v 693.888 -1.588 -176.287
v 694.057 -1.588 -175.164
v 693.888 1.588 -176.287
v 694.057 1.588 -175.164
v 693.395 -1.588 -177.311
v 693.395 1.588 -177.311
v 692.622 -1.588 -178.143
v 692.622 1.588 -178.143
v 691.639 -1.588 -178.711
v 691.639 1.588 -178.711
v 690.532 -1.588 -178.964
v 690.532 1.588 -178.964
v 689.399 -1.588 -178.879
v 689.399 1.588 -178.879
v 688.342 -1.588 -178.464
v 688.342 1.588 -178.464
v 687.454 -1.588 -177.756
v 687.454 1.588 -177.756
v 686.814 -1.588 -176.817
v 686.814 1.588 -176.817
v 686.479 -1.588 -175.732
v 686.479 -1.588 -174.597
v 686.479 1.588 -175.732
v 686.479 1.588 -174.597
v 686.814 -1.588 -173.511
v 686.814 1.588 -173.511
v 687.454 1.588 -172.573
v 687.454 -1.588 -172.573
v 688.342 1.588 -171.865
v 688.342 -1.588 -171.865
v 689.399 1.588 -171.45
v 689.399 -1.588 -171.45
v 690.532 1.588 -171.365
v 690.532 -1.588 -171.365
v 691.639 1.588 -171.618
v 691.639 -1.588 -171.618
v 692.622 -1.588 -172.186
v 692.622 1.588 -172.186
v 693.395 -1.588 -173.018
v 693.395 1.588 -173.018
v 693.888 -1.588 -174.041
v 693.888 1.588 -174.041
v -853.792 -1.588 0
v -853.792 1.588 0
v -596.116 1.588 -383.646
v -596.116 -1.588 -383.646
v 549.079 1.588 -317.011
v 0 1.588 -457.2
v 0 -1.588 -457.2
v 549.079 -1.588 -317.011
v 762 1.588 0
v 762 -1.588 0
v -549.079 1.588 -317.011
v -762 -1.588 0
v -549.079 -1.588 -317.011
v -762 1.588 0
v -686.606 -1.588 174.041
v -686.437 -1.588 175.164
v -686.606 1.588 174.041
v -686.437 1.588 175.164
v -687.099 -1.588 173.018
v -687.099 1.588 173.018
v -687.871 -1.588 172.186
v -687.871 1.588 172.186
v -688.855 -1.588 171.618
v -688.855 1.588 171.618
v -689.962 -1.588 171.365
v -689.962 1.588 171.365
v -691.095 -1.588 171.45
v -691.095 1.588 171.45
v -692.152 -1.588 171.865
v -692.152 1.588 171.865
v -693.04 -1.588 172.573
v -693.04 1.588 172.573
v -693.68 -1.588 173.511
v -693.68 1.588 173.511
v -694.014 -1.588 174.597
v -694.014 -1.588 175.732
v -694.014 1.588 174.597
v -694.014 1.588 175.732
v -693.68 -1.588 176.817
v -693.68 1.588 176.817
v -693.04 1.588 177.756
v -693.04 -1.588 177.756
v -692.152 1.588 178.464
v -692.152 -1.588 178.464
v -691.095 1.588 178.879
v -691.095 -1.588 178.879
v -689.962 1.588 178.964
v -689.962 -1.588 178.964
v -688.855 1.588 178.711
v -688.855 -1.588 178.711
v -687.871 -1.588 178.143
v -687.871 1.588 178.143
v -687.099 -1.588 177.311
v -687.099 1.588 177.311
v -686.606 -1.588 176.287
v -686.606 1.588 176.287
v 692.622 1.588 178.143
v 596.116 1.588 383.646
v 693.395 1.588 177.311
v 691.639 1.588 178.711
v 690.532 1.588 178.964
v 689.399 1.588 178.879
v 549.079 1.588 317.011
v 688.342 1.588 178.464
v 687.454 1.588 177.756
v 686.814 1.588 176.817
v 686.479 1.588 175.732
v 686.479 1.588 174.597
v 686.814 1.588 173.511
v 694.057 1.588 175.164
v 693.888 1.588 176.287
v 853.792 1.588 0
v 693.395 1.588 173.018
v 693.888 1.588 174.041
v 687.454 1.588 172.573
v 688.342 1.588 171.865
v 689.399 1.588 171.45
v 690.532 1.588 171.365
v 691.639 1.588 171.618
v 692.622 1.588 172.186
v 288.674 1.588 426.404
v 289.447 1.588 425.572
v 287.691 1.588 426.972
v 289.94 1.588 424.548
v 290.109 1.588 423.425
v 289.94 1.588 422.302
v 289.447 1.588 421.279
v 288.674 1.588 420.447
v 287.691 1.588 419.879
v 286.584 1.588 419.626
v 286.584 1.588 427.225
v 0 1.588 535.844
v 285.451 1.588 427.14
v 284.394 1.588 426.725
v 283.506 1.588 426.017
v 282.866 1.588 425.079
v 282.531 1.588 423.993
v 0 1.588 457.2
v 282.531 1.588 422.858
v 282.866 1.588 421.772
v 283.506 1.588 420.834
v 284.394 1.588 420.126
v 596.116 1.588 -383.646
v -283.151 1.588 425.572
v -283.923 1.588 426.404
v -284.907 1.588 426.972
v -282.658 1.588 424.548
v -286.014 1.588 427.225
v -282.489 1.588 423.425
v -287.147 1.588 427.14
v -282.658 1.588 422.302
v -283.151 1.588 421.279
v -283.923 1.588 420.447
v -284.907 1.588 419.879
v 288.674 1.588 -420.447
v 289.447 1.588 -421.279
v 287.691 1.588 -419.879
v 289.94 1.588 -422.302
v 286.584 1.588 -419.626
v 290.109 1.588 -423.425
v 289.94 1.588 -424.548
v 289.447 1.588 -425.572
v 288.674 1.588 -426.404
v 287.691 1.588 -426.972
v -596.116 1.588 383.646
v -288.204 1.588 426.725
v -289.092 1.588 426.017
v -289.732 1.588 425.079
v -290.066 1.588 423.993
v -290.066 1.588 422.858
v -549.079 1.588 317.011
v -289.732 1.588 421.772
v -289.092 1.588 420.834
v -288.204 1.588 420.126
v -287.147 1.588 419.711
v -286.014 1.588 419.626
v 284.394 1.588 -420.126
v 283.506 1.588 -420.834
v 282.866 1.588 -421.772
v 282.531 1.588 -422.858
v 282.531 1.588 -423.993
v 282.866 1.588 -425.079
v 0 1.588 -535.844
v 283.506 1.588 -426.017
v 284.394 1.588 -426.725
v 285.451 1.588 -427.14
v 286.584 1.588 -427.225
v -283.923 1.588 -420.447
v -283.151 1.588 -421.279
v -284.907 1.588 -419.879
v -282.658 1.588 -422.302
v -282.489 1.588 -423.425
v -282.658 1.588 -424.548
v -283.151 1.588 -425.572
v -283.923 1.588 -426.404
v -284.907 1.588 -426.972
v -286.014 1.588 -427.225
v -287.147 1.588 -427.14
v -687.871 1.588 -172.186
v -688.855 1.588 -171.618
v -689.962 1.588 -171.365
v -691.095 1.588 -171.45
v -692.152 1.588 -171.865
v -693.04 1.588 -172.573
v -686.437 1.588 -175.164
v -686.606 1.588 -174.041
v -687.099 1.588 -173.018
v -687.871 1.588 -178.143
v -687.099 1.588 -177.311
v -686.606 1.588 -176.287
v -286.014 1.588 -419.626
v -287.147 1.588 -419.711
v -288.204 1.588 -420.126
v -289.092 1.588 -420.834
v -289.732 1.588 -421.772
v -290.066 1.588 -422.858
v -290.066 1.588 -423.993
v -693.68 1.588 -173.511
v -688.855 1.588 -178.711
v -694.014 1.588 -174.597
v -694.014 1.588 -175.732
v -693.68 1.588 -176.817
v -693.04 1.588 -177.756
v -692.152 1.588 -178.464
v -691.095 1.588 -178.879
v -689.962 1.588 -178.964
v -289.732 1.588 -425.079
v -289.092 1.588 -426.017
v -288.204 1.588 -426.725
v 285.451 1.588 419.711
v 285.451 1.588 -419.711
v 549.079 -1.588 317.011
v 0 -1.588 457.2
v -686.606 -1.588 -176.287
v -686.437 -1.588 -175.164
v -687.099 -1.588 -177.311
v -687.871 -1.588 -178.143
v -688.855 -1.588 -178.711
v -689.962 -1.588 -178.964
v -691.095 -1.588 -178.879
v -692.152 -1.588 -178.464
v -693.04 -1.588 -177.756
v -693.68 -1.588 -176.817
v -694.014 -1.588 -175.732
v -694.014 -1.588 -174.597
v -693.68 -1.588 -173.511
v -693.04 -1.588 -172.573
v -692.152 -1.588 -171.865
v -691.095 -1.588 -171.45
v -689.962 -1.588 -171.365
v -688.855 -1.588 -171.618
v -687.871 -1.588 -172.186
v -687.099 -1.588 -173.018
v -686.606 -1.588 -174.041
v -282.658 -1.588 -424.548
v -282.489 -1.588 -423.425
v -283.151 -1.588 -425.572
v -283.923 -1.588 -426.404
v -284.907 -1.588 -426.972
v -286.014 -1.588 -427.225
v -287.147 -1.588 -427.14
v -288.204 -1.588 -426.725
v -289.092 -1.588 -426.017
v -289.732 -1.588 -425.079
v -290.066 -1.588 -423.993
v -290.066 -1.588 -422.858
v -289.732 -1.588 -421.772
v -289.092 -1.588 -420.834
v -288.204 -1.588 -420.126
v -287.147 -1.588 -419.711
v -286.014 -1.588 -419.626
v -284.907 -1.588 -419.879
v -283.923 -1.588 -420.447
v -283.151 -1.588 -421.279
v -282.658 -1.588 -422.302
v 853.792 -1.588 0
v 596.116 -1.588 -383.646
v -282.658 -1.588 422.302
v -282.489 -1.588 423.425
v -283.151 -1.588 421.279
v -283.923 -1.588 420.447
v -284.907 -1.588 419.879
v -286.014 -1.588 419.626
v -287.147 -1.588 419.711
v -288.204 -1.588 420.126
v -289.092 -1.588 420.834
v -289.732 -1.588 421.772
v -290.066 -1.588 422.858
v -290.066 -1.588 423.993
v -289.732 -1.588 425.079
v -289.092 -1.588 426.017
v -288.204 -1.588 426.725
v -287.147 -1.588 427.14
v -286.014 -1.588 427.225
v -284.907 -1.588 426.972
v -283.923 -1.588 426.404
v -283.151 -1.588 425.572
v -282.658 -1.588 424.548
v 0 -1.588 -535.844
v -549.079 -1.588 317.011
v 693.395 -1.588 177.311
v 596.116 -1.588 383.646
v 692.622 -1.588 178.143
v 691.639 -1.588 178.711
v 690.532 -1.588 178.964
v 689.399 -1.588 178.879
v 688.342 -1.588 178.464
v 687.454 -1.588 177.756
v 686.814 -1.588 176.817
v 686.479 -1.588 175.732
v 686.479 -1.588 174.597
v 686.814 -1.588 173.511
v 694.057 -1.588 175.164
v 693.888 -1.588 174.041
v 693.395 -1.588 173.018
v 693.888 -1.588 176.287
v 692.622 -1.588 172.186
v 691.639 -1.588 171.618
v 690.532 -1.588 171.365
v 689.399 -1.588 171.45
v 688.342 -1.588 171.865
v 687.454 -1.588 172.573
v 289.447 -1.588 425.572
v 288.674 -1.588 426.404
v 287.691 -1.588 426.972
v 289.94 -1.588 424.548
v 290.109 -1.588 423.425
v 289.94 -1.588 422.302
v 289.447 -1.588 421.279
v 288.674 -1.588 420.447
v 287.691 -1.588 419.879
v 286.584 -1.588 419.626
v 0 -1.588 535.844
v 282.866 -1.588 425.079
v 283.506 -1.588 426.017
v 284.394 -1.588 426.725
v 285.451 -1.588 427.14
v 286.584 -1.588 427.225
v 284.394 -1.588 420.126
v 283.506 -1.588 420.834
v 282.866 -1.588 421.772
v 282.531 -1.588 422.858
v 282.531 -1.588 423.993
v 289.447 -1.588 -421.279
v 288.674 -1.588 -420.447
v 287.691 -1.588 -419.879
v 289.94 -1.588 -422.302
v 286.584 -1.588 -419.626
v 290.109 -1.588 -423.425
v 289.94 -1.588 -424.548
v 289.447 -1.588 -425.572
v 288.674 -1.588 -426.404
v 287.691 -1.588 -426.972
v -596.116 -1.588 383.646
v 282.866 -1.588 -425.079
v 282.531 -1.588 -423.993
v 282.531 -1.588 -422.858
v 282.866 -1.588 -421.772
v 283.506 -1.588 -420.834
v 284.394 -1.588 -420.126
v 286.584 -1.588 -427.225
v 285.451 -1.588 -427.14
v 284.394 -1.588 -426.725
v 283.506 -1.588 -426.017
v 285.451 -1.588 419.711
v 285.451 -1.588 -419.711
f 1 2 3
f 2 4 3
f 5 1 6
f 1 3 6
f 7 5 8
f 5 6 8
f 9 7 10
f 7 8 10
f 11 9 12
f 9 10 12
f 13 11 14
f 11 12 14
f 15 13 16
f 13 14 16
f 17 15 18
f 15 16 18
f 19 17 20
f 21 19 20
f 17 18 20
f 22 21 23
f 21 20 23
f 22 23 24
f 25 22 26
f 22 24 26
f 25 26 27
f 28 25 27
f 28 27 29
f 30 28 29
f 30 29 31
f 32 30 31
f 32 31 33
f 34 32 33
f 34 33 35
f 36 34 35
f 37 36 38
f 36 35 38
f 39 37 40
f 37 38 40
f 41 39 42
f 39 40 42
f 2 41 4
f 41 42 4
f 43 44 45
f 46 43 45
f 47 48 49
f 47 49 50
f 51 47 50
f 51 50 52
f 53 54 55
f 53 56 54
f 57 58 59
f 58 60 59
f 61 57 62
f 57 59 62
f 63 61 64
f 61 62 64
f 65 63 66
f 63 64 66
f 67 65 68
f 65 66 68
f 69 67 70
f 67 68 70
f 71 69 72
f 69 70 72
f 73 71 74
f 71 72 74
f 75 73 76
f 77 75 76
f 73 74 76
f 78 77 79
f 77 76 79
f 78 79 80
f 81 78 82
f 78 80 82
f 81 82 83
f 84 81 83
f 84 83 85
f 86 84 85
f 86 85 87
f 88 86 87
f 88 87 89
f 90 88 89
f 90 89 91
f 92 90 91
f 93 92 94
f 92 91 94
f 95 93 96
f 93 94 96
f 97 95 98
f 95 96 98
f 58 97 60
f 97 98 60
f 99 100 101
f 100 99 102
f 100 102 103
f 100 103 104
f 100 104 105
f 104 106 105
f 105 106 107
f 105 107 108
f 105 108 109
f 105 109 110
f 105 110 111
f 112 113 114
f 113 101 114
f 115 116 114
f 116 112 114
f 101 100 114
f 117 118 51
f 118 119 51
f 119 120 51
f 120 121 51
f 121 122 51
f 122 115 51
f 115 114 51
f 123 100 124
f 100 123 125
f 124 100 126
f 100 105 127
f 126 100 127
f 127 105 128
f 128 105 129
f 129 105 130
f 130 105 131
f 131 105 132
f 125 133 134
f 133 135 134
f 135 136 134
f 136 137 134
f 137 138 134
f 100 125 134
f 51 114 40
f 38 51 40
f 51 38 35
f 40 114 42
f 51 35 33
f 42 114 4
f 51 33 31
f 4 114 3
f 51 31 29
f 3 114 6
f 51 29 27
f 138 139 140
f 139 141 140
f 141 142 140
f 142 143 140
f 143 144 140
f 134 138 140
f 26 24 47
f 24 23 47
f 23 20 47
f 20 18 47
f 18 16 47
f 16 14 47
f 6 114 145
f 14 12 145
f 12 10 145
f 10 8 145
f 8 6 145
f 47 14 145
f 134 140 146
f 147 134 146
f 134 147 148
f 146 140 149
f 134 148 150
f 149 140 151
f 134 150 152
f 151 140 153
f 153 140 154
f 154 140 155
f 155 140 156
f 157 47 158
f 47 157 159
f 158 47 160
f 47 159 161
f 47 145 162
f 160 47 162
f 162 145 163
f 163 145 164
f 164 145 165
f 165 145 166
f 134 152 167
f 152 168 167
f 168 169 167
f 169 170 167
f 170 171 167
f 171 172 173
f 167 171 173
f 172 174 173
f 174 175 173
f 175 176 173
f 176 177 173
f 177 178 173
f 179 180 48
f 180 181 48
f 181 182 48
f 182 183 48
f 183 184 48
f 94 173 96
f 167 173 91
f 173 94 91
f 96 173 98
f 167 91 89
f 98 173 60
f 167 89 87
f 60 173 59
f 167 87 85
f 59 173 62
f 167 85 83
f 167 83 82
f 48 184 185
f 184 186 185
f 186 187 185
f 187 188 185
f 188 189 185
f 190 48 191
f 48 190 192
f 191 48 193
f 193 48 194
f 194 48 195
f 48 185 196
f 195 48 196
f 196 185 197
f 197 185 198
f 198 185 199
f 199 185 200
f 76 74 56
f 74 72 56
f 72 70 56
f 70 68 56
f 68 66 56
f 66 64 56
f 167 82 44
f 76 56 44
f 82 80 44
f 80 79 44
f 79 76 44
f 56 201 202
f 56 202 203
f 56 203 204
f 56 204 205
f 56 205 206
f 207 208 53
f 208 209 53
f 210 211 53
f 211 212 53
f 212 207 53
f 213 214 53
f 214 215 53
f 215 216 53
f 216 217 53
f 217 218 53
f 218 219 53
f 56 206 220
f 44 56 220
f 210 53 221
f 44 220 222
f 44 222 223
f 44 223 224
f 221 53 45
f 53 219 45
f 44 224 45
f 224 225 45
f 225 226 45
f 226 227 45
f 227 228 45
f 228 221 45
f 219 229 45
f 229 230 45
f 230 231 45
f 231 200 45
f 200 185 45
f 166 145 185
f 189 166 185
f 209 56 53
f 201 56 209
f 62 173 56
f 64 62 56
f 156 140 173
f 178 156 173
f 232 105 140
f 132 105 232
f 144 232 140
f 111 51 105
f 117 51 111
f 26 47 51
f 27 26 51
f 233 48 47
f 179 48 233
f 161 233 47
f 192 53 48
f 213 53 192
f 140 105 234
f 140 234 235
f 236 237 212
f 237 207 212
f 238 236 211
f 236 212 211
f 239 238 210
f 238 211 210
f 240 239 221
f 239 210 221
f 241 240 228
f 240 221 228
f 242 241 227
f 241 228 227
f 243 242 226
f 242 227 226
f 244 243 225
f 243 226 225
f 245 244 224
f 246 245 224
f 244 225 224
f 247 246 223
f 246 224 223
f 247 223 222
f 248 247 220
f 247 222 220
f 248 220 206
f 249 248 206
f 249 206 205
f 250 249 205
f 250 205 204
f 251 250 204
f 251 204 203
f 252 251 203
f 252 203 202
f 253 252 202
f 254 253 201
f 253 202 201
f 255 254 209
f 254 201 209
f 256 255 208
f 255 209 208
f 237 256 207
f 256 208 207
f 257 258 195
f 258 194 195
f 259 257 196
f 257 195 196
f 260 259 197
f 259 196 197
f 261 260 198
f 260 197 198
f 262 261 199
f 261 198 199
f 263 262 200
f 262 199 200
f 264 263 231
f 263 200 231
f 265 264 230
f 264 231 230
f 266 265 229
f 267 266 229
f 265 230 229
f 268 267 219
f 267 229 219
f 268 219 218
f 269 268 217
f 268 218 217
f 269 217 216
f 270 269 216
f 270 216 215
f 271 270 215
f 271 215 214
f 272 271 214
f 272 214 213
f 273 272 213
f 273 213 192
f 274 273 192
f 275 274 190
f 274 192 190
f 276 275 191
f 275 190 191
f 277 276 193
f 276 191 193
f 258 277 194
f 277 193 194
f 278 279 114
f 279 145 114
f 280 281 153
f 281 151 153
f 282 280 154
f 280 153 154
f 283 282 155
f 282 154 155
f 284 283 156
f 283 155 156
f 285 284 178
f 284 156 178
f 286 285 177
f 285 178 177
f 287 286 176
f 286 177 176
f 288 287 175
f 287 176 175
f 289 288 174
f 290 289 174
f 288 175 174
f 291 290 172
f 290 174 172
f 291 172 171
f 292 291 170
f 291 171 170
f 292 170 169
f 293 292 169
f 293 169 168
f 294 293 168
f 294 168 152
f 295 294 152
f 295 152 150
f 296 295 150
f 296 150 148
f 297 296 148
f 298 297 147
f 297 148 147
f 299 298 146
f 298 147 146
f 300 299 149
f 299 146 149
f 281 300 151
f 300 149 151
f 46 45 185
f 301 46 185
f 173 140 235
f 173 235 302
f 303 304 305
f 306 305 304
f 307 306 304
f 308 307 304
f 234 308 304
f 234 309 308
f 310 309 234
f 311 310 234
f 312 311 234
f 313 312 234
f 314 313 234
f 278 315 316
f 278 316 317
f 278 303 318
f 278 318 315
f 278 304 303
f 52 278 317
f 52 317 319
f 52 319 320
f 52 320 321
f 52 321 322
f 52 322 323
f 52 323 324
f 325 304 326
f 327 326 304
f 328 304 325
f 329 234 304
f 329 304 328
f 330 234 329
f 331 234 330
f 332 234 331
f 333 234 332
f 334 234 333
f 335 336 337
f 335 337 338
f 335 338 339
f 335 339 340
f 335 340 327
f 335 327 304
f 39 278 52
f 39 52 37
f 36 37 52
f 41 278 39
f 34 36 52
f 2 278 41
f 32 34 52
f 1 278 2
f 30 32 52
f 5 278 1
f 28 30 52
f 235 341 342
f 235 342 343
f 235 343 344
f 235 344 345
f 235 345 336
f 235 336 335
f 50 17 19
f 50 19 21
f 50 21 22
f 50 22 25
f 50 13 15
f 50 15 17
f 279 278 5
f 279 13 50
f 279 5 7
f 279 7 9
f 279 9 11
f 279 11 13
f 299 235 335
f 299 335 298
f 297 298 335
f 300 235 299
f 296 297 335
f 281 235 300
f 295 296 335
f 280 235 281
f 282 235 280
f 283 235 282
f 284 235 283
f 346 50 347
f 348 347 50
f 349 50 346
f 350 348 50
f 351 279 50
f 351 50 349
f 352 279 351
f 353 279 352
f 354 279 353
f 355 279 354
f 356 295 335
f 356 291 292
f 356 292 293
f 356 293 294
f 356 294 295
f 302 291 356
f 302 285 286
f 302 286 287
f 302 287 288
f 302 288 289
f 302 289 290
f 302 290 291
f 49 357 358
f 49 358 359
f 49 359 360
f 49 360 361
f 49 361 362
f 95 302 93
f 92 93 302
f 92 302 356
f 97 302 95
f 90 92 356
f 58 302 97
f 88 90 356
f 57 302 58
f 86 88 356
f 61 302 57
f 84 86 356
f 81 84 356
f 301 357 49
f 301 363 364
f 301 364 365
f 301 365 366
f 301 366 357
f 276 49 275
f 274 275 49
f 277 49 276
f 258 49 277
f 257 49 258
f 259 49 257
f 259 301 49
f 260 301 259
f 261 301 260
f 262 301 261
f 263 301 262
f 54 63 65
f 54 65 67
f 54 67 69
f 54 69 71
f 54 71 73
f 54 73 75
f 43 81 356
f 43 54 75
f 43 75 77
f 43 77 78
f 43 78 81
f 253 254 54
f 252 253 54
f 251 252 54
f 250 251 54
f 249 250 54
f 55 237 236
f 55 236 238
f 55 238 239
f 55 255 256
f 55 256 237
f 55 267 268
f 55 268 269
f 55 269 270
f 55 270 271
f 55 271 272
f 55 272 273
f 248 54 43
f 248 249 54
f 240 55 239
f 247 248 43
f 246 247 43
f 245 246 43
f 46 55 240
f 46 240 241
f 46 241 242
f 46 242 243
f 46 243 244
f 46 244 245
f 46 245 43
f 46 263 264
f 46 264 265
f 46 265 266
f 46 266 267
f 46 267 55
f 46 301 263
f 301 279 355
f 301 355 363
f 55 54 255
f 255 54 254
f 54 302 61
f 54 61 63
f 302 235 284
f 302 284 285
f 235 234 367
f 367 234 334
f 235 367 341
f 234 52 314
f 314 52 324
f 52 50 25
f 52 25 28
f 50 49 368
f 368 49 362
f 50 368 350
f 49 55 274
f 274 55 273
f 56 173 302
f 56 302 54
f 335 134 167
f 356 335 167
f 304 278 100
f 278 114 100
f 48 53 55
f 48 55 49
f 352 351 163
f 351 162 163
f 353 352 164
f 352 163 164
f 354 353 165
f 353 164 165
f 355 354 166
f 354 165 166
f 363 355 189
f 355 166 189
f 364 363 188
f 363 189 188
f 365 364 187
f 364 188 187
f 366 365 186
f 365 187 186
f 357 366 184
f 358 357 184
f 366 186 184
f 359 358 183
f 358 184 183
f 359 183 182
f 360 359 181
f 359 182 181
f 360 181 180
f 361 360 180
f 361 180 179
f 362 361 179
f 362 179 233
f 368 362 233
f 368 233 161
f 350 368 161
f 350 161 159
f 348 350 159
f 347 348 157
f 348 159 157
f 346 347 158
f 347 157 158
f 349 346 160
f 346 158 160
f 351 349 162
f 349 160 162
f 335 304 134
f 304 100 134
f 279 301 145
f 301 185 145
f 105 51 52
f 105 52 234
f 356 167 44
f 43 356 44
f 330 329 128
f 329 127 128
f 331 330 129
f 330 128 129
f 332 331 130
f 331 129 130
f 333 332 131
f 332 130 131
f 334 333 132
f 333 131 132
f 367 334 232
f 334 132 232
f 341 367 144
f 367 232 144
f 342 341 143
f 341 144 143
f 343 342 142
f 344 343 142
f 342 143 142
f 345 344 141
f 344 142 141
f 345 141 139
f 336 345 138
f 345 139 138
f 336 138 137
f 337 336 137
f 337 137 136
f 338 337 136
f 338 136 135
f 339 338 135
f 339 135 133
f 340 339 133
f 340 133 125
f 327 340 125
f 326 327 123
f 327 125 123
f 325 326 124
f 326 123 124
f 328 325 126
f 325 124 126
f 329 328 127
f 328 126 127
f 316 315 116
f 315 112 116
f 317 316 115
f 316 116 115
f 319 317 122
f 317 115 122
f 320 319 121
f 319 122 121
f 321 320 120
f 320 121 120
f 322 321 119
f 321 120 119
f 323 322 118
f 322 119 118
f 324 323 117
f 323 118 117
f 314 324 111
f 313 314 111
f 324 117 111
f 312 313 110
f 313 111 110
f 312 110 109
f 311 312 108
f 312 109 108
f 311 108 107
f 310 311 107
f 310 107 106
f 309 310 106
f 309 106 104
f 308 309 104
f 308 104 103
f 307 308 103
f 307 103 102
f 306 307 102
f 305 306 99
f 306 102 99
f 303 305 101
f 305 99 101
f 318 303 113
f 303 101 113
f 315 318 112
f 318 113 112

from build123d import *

# Parameters (mm, degrees)
BOSS_EXTRUDE1_DEPTH     = 1.5875
SKETCH3_R               = 3.81
CUT_EXTRUDE1_DEPTH      = 2.5875
CUT_EXTRUDE1_DEPTH_BACK = 2.5875


with BuildPart() as part:
    # Sketch2 → Boss-Extrude1 (new body, symmetric)
    with BuildSketch(Plane(origin=(0, 0, 0), x_dir=(1, 0, 0), z_dir=(0, 1, 0))):
        Polygon((-596.116107134, 383.646334781), (0, 535.844392641), (596.116107134, 383.646334781), (853.792184287, 0), (596.116107134, -383.646334781), (0, -535.844392641), (-596.116107134, -383.646334781), (-853.792184287, 0), align=None)
        Polygon((-762, 0), (-549.079439398, 317.011162143), (0, 457.2), (549.079439398, 317.011162143), (762, 0), (549.079439398, -317.011162143), (0, -457.2), (-549.079439398, -317.011162143), align=None, mode=Mode.SUBTRACT)
    extrude(amount=BOSS_EXTRUDE1_DEPTH, both=True)

    # Sketch3 → Cut-Extrude1 (cut, two sides)
    with BuildSketch(Plane(origin=(0, 0, 0), x_dir=(1, 0, 0), z_dir=(0, 1, 0))) as cut_extrude1_sk:
        with Locations((690.246932705, 175.164374231)):
            Circle(SKETCH3_R)
        with Locations((690.246932705, -175.164374231)):
            Circle(SKETCH3_R)
        with Locations((-690.246932705, -175.164374231)):
            Circle(SKETCH3_R)
        with Locations((-690.246932705, 175.164374231)):
            Circle(SKETCH3_R)
        with Locations((-286.298886633, 423.425472391)):
            Circle(SKETCH3_R)
        with Locations((286.298886633, 423.425472391)):
            Circle(SKETCH3_R)
        with Locations((286.298886633, -423.425472391)):
            Circle(SKETCH3_R)
        with Locations((-286.298886633, -423.425472391)):
            Circle(SKETCH3_R)
    extrude(amount=CUT_EXTRUDE1_DEPTH, mode=Mode.SUBTRACT)
    extrude(cut_extrude1_sk.sketch, amount=-CUT_EXTRUDE1_DEPTH_BACK, mode=Mode.SUBTRACT)


solid = part.part
